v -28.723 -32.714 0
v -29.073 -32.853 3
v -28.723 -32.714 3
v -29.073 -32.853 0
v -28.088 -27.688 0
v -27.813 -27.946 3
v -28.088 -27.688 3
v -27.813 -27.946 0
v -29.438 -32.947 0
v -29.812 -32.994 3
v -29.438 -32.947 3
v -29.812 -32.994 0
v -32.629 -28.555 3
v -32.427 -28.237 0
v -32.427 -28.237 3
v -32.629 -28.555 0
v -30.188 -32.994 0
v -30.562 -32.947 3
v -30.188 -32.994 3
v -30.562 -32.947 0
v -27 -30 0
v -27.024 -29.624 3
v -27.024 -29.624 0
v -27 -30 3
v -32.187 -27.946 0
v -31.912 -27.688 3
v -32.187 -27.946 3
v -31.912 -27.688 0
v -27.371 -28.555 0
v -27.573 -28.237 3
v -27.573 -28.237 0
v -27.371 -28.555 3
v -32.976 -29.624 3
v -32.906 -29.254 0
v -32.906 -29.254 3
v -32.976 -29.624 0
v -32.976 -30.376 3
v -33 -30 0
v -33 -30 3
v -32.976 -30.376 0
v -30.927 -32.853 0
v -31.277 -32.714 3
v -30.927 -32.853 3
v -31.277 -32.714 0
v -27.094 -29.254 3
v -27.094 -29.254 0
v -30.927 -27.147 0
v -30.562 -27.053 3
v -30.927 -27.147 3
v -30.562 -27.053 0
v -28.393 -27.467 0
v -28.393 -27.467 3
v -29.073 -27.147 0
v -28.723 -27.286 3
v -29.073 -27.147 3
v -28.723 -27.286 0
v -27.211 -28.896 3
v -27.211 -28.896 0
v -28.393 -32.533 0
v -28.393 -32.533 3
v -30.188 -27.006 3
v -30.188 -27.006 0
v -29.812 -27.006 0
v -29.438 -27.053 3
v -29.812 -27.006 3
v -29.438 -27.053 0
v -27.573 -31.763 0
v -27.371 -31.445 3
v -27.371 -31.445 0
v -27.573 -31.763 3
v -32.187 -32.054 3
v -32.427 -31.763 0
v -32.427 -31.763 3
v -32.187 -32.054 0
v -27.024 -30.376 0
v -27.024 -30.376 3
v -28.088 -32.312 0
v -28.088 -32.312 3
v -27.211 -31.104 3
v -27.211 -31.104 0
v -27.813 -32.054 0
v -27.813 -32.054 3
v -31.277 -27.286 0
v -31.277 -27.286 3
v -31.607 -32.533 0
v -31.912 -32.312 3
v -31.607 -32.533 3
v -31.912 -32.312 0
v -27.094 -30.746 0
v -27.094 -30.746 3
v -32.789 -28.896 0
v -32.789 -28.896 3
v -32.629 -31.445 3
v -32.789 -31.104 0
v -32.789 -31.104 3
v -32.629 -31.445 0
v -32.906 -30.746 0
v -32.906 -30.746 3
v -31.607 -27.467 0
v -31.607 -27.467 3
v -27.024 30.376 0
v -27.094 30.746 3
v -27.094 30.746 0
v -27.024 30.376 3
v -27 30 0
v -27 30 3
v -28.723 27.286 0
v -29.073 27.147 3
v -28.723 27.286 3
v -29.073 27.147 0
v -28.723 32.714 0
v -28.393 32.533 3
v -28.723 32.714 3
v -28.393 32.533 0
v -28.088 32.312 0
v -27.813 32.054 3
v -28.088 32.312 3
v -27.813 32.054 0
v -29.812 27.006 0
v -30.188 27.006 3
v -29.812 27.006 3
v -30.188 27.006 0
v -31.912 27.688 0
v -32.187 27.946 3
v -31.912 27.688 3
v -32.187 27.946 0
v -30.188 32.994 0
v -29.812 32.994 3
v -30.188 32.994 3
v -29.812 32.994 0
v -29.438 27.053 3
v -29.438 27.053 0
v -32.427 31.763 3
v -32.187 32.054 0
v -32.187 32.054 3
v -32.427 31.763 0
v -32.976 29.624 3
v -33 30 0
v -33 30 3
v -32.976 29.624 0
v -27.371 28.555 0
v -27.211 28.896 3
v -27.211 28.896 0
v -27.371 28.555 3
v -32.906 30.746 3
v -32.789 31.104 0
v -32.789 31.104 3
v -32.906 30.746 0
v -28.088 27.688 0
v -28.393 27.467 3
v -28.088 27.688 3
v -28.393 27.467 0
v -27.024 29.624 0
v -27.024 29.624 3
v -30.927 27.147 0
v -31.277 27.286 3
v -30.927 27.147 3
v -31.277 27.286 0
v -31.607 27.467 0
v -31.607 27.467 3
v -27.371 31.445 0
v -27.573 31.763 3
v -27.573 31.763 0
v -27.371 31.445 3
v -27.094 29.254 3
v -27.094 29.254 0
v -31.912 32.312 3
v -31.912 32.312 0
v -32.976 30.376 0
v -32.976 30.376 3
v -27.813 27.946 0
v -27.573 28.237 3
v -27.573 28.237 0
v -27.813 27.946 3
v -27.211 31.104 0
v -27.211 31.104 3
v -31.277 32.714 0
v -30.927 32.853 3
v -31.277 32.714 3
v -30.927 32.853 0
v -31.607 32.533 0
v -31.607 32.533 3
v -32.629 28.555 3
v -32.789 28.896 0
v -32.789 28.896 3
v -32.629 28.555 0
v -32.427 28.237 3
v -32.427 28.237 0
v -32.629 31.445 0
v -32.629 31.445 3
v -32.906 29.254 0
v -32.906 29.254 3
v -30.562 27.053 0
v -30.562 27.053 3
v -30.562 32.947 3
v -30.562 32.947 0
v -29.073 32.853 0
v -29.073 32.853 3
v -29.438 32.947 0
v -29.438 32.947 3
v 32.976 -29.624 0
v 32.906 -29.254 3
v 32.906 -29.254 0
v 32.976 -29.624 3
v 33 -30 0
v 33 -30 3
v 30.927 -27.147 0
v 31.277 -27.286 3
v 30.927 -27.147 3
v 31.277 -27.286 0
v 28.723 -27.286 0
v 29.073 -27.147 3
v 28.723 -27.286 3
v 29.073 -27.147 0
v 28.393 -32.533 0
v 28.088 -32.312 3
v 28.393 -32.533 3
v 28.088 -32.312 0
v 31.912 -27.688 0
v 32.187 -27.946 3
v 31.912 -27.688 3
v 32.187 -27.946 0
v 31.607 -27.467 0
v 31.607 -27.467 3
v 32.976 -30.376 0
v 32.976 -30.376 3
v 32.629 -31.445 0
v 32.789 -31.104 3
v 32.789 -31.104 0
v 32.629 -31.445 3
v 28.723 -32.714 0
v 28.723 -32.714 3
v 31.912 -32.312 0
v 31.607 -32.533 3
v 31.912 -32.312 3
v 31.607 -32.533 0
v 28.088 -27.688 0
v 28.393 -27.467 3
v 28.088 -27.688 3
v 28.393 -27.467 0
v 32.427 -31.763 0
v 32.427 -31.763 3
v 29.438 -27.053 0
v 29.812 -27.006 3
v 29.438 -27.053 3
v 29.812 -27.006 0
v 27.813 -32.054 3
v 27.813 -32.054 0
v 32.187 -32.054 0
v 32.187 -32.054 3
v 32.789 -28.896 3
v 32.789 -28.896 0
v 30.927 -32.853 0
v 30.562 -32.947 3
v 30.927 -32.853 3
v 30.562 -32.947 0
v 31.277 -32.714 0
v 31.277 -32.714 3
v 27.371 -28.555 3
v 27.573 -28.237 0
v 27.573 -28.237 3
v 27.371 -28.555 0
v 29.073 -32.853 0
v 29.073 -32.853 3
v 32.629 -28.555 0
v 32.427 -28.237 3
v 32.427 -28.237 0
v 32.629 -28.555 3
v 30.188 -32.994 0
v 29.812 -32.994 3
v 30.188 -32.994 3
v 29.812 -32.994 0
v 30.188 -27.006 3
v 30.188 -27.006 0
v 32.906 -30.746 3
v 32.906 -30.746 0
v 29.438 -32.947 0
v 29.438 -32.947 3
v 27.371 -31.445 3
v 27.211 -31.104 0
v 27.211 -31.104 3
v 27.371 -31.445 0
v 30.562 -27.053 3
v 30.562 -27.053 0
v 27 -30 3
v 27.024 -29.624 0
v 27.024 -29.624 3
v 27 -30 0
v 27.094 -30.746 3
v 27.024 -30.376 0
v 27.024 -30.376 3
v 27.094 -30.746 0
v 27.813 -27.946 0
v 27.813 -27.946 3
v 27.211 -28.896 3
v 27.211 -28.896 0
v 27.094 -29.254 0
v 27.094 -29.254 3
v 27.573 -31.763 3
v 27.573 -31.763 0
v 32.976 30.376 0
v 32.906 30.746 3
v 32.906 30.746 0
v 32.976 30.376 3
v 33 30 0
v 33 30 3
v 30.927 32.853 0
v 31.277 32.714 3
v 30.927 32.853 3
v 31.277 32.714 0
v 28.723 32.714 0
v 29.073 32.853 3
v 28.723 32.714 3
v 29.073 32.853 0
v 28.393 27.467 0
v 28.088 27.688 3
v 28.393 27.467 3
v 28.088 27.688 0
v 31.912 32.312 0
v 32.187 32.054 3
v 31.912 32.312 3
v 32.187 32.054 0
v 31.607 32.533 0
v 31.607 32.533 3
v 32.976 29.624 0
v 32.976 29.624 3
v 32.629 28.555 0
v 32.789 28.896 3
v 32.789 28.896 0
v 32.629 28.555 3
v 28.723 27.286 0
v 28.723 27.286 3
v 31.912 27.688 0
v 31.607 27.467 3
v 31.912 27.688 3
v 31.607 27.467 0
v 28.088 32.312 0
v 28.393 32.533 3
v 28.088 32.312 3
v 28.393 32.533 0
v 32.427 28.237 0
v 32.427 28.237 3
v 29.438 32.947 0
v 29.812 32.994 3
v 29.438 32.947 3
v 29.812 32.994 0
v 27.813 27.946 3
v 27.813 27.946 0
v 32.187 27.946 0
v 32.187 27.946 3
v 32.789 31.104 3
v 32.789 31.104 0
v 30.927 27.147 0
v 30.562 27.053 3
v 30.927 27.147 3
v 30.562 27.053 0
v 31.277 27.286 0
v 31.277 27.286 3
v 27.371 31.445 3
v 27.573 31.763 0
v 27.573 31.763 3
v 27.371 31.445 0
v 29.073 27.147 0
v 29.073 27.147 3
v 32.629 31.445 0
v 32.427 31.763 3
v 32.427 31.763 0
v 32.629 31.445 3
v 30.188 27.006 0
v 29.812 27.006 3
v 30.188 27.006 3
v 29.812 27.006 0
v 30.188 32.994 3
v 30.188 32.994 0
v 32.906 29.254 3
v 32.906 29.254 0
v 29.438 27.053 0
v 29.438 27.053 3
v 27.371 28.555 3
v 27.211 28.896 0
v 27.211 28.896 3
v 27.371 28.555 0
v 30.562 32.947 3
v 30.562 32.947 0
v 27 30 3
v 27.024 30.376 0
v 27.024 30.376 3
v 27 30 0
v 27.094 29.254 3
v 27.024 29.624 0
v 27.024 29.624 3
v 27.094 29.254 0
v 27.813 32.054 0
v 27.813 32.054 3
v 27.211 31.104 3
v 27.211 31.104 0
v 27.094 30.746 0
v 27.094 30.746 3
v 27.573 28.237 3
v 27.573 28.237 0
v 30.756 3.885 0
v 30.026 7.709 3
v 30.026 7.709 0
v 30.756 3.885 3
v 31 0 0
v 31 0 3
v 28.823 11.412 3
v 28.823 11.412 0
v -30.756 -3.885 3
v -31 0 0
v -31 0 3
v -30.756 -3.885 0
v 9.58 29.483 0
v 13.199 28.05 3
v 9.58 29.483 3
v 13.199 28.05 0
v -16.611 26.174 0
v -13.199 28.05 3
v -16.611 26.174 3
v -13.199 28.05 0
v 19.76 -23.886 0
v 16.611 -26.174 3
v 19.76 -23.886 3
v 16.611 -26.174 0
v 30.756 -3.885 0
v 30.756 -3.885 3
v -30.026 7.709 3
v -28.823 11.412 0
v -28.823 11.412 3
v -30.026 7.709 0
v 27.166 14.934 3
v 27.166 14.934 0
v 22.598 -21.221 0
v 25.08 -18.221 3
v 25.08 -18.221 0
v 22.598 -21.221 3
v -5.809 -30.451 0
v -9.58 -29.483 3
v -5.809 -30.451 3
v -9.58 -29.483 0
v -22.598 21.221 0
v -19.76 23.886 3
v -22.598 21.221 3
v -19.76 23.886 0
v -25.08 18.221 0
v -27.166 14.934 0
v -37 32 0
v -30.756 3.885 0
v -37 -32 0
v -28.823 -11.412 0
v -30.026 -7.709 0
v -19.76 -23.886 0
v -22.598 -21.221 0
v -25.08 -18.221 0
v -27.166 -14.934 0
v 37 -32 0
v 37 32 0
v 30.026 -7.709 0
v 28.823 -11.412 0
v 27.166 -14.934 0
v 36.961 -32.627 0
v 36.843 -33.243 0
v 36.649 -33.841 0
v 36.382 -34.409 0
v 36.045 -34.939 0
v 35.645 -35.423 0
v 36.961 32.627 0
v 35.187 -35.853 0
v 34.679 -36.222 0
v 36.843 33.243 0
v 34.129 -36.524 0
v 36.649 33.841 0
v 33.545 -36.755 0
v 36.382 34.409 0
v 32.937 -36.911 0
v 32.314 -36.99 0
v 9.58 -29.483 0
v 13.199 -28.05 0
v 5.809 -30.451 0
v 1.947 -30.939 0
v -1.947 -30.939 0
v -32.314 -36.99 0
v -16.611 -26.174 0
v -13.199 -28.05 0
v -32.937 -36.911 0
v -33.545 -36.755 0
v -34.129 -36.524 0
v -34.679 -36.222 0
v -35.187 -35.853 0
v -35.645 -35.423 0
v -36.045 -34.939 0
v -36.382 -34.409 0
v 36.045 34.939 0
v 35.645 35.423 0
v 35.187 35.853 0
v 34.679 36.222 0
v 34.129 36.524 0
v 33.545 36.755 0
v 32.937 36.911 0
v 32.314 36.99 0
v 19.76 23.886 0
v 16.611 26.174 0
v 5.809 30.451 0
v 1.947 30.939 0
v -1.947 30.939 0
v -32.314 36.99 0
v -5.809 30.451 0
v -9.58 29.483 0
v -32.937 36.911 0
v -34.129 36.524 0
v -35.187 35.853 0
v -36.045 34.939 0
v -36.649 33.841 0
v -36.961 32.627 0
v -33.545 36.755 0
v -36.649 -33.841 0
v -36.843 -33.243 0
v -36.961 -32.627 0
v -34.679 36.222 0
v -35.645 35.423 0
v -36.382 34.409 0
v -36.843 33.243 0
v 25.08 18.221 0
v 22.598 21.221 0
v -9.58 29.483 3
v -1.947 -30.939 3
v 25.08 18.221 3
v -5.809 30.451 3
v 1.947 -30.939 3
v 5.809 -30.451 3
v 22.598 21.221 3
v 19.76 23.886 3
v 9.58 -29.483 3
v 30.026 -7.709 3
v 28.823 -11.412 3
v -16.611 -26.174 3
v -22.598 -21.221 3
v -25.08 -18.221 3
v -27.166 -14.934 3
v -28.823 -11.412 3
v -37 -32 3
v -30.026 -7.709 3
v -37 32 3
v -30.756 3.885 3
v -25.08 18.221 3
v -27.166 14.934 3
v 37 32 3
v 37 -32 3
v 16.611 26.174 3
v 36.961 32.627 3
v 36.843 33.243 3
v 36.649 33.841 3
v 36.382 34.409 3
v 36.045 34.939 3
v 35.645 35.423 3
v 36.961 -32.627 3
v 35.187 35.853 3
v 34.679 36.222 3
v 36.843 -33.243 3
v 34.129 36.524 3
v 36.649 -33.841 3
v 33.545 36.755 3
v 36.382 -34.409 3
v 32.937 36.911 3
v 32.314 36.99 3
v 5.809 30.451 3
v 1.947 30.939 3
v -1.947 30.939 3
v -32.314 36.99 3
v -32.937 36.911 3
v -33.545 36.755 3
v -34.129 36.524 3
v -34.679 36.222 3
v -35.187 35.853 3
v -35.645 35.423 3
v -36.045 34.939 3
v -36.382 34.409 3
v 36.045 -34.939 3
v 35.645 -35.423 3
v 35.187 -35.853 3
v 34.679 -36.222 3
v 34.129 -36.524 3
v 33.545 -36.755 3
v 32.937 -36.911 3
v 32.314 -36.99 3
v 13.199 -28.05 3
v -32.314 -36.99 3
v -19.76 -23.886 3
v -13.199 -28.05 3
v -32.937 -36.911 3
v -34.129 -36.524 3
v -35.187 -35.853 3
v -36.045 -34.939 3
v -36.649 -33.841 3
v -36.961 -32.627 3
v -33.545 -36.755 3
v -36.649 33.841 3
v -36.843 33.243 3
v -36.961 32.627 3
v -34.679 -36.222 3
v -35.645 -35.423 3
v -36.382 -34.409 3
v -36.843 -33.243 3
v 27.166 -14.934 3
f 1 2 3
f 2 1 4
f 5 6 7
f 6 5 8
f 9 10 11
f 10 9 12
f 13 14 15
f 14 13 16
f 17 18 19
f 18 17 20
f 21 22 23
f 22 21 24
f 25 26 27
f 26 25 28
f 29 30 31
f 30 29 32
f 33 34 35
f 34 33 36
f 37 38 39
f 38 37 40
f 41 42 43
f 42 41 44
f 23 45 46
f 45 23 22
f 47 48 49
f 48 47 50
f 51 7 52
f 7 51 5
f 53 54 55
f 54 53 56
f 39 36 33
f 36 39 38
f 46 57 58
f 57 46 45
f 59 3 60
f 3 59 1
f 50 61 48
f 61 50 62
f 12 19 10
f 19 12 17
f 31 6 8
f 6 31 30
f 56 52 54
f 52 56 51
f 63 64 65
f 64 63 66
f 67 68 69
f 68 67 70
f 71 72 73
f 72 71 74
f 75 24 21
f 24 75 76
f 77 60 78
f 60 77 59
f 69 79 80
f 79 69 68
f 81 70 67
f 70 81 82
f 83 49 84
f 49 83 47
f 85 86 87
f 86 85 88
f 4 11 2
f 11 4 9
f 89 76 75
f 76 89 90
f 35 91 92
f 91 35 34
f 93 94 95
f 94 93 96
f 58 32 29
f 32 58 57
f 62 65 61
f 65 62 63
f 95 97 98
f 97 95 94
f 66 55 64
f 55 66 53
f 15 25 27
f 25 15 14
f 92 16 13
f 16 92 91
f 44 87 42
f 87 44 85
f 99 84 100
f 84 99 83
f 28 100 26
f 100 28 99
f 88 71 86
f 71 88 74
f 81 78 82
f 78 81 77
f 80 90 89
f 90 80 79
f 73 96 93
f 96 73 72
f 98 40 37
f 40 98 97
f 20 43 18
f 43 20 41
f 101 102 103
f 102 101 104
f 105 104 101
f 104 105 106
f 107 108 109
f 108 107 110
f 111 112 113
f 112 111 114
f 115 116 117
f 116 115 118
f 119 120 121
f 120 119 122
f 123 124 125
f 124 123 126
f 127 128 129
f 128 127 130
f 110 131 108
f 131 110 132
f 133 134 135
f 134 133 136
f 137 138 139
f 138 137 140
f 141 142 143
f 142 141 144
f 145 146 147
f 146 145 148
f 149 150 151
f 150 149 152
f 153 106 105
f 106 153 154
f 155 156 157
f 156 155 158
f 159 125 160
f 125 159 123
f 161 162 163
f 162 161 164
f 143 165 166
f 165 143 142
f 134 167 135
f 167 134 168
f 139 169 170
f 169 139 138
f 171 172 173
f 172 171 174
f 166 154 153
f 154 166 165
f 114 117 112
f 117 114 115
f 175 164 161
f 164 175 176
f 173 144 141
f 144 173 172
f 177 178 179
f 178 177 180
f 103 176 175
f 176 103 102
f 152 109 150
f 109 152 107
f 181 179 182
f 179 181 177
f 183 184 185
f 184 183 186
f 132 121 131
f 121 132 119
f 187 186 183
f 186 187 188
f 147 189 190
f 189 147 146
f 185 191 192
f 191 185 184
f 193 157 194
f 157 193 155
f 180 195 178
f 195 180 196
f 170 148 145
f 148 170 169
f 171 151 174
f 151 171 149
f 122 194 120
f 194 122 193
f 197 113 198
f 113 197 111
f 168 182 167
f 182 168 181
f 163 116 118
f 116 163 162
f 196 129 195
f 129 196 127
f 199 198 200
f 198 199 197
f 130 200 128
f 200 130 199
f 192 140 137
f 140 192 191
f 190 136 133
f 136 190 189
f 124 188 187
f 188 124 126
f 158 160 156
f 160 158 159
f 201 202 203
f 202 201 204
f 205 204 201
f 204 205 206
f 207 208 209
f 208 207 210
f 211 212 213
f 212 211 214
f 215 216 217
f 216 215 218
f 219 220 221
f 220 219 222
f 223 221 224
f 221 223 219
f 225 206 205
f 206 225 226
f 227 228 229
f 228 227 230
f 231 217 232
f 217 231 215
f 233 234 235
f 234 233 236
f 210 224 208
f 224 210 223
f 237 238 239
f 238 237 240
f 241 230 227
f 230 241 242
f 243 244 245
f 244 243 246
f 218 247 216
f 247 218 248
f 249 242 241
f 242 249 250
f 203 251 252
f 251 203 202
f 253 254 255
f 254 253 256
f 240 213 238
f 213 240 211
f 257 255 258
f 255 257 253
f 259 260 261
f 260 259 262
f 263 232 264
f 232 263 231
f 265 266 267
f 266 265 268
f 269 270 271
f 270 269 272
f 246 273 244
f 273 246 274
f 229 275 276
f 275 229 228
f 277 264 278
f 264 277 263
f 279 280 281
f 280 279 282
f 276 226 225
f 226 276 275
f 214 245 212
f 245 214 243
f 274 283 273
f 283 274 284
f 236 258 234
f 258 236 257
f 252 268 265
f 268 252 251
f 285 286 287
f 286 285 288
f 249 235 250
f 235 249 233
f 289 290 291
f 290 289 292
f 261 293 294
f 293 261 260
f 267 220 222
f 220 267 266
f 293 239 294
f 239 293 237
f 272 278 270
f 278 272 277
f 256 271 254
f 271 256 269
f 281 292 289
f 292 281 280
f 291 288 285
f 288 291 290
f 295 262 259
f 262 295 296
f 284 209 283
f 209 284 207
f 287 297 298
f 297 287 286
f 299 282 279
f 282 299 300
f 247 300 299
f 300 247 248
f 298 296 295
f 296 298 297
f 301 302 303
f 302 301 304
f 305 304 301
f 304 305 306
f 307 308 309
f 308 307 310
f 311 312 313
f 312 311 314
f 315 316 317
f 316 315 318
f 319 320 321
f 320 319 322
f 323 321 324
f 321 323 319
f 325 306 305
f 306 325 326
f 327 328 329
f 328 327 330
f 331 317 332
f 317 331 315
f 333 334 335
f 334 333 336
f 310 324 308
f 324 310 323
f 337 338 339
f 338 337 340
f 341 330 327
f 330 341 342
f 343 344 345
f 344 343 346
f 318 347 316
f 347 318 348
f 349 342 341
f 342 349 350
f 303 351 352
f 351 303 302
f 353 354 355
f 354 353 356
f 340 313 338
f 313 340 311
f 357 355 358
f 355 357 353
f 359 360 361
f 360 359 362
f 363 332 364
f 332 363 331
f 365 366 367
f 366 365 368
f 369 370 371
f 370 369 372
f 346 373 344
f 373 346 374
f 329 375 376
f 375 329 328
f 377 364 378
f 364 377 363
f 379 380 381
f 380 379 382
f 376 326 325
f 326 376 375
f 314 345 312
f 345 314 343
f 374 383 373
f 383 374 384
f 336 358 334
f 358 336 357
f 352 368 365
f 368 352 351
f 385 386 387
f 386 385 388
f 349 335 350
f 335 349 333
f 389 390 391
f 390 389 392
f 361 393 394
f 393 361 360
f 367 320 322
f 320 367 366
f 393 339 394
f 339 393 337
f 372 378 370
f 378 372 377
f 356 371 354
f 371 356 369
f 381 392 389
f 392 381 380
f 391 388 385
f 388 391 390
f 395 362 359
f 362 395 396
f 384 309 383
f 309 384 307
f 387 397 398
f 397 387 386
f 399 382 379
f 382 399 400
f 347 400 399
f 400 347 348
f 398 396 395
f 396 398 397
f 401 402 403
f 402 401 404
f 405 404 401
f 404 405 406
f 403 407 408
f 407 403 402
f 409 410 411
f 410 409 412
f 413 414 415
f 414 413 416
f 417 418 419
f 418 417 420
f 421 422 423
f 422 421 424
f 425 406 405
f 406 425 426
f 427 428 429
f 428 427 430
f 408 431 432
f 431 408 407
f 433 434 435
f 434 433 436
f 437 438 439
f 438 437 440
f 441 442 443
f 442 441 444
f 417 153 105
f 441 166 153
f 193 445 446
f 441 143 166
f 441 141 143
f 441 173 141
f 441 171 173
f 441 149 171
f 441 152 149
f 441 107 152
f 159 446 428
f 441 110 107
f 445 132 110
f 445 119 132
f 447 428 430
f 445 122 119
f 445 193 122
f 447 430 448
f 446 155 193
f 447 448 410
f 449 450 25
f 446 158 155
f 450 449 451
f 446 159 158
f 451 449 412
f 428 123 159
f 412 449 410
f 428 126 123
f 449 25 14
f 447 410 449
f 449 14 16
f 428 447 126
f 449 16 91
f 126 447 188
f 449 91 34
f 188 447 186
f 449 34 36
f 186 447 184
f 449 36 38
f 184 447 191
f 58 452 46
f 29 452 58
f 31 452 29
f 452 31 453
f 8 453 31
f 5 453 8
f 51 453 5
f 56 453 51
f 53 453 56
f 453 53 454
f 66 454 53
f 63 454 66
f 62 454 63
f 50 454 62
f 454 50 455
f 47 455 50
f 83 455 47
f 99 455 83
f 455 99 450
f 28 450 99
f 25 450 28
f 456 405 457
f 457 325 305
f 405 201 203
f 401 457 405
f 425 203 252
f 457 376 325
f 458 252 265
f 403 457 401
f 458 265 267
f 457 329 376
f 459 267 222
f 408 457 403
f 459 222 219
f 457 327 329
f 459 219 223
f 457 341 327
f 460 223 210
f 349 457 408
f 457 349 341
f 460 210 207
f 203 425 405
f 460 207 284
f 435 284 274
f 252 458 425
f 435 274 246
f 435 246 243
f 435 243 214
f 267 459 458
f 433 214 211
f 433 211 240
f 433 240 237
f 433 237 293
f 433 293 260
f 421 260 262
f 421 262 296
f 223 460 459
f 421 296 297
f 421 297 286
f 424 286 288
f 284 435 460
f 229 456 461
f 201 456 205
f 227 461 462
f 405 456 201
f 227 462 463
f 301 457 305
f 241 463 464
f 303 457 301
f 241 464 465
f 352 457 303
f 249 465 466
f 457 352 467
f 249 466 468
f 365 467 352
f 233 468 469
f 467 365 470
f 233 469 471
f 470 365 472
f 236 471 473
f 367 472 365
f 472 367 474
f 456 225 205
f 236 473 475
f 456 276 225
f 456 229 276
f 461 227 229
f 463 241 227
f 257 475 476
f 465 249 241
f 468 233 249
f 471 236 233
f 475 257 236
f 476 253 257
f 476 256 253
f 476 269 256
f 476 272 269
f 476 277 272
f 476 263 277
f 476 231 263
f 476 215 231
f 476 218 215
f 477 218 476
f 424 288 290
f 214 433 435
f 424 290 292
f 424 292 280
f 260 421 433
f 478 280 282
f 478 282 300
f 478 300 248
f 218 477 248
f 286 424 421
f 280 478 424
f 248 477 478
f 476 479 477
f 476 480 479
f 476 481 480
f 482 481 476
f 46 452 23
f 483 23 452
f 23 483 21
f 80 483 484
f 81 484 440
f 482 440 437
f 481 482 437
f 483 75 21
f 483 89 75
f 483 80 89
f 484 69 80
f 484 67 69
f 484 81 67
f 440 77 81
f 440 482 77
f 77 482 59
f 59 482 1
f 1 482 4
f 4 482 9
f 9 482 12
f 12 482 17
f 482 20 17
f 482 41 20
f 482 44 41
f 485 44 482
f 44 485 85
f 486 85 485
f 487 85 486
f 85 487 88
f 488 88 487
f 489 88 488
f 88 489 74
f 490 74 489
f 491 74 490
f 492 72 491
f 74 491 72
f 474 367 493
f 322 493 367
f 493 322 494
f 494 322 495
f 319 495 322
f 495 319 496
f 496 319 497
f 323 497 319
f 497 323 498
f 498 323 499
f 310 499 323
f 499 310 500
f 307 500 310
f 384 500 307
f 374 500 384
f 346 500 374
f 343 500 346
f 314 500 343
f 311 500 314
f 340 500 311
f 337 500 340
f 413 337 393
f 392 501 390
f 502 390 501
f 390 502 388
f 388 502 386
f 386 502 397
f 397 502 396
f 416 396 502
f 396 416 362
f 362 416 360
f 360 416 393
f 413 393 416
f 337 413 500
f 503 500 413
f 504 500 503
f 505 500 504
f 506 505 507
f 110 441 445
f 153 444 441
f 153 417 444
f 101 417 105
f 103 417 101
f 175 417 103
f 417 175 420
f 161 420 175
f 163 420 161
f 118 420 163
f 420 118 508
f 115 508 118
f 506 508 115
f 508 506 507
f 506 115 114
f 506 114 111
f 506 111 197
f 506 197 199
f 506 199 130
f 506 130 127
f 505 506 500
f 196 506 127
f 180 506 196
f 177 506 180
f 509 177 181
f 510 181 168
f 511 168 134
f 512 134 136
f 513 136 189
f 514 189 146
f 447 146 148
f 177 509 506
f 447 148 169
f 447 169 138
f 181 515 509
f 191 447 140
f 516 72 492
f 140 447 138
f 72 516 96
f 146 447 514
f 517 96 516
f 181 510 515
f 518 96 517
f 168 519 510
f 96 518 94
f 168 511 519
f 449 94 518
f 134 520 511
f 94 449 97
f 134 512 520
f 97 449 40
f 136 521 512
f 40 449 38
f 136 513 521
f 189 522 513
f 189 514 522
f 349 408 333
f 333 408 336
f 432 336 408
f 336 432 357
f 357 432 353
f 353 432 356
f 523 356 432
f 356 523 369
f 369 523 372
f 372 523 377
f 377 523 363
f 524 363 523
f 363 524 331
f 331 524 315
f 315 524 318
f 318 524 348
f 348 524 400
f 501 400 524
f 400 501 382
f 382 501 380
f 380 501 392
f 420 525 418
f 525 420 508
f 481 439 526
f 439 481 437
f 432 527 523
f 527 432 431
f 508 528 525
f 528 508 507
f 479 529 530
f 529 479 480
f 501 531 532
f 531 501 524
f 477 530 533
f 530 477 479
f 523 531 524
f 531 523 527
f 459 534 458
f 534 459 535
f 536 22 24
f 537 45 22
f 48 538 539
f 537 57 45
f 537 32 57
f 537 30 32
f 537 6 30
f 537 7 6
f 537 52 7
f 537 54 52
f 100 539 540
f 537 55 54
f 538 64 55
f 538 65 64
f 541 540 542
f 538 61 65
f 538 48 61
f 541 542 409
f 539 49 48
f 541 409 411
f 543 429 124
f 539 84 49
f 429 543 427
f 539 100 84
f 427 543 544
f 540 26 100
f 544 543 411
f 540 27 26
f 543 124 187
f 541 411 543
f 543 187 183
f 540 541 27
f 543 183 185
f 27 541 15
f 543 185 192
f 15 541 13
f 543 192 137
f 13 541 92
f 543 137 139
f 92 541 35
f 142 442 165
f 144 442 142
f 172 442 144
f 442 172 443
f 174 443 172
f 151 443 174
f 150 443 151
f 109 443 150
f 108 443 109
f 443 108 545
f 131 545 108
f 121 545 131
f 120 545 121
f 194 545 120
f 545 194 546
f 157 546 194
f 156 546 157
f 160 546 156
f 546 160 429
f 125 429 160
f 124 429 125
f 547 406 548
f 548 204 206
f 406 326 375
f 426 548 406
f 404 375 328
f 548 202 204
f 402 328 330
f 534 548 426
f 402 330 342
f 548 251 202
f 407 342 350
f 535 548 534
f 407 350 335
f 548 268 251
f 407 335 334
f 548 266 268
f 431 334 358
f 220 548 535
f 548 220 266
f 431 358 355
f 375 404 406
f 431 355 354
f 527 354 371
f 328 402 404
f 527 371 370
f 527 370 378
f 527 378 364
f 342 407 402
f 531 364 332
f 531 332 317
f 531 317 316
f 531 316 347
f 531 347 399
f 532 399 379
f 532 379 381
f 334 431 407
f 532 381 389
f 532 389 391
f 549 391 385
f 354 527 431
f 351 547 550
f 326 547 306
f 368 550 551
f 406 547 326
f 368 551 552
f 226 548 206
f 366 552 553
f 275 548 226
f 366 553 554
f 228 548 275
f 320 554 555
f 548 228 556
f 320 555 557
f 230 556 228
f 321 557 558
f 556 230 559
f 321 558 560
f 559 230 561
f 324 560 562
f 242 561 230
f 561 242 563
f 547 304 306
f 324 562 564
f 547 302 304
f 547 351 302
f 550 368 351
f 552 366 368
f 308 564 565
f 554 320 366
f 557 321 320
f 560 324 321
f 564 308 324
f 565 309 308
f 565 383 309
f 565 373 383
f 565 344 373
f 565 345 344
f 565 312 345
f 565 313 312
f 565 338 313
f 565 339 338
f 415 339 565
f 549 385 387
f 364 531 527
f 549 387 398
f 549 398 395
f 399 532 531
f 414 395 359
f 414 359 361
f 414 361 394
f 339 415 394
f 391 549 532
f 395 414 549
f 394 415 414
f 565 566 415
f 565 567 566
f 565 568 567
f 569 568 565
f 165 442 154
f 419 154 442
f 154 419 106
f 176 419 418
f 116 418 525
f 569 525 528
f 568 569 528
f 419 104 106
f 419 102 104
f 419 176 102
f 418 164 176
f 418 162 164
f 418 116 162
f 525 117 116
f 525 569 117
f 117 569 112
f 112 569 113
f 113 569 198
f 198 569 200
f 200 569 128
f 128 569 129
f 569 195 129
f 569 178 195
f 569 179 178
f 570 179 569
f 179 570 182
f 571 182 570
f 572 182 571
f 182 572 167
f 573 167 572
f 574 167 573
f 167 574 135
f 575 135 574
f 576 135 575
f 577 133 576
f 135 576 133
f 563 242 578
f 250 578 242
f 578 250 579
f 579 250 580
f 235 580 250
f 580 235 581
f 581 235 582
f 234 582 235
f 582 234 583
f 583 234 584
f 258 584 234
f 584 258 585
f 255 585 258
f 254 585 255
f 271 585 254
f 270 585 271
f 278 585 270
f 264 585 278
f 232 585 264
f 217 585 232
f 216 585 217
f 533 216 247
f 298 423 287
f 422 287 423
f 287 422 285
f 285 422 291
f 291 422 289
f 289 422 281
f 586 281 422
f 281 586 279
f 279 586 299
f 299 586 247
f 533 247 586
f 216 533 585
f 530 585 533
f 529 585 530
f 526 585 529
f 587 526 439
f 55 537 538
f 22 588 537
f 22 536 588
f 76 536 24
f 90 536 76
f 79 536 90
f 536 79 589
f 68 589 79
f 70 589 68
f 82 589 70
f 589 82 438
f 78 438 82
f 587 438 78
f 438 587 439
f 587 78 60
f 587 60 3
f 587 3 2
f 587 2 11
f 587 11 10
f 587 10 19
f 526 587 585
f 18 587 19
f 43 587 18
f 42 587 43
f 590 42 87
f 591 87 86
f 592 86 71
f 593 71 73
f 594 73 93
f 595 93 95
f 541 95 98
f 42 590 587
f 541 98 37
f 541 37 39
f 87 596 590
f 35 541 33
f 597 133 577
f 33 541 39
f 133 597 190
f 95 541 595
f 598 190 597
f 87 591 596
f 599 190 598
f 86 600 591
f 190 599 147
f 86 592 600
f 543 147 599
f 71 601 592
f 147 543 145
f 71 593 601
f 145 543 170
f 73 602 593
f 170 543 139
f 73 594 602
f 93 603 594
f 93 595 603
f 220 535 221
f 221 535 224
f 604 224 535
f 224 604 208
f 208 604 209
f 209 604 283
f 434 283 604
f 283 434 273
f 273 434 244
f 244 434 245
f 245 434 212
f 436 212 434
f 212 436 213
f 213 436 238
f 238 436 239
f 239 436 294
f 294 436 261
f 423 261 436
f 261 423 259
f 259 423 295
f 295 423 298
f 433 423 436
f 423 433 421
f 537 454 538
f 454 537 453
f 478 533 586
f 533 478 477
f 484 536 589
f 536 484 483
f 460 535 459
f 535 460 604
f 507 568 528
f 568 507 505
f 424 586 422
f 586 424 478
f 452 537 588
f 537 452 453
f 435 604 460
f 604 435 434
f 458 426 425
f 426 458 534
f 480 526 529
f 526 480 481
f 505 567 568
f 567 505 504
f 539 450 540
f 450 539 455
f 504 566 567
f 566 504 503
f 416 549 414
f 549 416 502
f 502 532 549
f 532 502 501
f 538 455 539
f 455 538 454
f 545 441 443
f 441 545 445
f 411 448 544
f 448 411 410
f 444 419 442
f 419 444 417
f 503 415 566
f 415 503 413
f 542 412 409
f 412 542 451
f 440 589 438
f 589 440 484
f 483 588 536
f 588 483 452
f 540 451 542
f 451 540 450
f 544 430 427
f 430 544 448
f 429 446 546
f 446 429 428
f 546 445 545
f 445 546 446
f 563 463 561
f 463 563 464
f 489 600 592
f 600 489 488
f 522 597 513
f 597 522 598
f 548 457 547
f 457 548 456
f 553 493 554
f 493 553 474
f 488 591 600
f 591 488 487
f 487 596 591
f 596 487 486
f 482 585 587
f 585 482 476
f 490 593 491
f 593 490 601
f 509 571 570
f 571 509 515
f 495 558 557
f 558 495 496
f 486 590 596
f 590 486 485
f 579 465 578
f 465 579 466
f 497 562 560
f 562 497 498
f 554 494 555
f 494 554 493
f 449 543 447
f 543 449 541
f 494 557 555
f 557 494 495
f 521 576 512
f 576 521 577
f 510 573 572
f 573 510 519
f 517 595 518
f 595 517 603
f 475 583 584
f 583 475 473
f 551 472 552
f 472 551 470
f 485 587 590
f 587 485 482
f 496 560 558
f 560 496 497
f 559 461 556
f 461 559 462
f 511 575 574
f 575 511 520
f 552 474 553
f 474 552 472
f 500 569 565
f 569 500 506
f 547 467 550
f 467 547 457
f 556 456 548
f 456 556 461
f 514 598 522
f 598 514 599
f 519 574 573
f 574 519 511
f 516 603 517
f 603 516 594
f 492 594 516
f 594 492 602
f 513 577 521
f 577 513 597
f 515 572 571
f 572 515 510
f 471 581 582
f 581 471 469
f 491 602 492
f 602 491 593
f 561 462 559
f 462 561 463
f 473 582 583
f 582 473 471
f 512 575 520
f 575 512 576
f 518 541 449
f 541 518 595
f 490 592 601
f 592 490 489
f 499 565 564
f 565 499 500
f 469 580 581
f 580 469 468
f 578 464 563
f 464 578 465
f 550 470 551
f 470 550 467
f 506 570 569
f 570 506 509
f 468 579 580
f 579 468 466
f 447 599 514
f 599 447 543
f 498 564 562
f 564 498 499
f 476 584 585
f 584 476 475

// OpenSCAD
$fn = 50;


difference() {
	union() {
		hull() {
			translate(v = [-32.0000000000, 32.0000000000, 0]) {
				cylinder(h = 3, r = 5);
			}
			translate(v = [32.0000000000, 32.0000000000, 0]) {
				cylinder(h = 3, r = 5);
			}
			translate(v = [-32.0000000000, -32.0000000000, 0]) {
				cylinder(h = 3, r = 5);
			}
			translate(v = [32.0000000000, -32.0000000000, 0]) {
				cylinder(h = 3, r = 5);
			}
		}
	}
	union() {
		#translate(v = [-30.0000000000, -30.0000000000, -100.0000000000]) {
			cylinder(h = 200, r = 3.0000000000);
		}
		#translate(v = [-30.0000000000, 30.0000000000, -100.0000000000]) {
			cylinder(h = 200, r = 3.0000000000);
		}
		#translate(v = [30.0000000000, -30.0000000000, -100.0000000000]) {
			cylinder(h = 200, r = 3.0000000000);
		}
		#translate(v = [30.0000000000, 30.0000000000, -100.0000000000]) {
			cylinder(h = 200, r = 3.0000000000);
		}
		#cylinder(h = 3, r = 31.0000000000);
	}
}
